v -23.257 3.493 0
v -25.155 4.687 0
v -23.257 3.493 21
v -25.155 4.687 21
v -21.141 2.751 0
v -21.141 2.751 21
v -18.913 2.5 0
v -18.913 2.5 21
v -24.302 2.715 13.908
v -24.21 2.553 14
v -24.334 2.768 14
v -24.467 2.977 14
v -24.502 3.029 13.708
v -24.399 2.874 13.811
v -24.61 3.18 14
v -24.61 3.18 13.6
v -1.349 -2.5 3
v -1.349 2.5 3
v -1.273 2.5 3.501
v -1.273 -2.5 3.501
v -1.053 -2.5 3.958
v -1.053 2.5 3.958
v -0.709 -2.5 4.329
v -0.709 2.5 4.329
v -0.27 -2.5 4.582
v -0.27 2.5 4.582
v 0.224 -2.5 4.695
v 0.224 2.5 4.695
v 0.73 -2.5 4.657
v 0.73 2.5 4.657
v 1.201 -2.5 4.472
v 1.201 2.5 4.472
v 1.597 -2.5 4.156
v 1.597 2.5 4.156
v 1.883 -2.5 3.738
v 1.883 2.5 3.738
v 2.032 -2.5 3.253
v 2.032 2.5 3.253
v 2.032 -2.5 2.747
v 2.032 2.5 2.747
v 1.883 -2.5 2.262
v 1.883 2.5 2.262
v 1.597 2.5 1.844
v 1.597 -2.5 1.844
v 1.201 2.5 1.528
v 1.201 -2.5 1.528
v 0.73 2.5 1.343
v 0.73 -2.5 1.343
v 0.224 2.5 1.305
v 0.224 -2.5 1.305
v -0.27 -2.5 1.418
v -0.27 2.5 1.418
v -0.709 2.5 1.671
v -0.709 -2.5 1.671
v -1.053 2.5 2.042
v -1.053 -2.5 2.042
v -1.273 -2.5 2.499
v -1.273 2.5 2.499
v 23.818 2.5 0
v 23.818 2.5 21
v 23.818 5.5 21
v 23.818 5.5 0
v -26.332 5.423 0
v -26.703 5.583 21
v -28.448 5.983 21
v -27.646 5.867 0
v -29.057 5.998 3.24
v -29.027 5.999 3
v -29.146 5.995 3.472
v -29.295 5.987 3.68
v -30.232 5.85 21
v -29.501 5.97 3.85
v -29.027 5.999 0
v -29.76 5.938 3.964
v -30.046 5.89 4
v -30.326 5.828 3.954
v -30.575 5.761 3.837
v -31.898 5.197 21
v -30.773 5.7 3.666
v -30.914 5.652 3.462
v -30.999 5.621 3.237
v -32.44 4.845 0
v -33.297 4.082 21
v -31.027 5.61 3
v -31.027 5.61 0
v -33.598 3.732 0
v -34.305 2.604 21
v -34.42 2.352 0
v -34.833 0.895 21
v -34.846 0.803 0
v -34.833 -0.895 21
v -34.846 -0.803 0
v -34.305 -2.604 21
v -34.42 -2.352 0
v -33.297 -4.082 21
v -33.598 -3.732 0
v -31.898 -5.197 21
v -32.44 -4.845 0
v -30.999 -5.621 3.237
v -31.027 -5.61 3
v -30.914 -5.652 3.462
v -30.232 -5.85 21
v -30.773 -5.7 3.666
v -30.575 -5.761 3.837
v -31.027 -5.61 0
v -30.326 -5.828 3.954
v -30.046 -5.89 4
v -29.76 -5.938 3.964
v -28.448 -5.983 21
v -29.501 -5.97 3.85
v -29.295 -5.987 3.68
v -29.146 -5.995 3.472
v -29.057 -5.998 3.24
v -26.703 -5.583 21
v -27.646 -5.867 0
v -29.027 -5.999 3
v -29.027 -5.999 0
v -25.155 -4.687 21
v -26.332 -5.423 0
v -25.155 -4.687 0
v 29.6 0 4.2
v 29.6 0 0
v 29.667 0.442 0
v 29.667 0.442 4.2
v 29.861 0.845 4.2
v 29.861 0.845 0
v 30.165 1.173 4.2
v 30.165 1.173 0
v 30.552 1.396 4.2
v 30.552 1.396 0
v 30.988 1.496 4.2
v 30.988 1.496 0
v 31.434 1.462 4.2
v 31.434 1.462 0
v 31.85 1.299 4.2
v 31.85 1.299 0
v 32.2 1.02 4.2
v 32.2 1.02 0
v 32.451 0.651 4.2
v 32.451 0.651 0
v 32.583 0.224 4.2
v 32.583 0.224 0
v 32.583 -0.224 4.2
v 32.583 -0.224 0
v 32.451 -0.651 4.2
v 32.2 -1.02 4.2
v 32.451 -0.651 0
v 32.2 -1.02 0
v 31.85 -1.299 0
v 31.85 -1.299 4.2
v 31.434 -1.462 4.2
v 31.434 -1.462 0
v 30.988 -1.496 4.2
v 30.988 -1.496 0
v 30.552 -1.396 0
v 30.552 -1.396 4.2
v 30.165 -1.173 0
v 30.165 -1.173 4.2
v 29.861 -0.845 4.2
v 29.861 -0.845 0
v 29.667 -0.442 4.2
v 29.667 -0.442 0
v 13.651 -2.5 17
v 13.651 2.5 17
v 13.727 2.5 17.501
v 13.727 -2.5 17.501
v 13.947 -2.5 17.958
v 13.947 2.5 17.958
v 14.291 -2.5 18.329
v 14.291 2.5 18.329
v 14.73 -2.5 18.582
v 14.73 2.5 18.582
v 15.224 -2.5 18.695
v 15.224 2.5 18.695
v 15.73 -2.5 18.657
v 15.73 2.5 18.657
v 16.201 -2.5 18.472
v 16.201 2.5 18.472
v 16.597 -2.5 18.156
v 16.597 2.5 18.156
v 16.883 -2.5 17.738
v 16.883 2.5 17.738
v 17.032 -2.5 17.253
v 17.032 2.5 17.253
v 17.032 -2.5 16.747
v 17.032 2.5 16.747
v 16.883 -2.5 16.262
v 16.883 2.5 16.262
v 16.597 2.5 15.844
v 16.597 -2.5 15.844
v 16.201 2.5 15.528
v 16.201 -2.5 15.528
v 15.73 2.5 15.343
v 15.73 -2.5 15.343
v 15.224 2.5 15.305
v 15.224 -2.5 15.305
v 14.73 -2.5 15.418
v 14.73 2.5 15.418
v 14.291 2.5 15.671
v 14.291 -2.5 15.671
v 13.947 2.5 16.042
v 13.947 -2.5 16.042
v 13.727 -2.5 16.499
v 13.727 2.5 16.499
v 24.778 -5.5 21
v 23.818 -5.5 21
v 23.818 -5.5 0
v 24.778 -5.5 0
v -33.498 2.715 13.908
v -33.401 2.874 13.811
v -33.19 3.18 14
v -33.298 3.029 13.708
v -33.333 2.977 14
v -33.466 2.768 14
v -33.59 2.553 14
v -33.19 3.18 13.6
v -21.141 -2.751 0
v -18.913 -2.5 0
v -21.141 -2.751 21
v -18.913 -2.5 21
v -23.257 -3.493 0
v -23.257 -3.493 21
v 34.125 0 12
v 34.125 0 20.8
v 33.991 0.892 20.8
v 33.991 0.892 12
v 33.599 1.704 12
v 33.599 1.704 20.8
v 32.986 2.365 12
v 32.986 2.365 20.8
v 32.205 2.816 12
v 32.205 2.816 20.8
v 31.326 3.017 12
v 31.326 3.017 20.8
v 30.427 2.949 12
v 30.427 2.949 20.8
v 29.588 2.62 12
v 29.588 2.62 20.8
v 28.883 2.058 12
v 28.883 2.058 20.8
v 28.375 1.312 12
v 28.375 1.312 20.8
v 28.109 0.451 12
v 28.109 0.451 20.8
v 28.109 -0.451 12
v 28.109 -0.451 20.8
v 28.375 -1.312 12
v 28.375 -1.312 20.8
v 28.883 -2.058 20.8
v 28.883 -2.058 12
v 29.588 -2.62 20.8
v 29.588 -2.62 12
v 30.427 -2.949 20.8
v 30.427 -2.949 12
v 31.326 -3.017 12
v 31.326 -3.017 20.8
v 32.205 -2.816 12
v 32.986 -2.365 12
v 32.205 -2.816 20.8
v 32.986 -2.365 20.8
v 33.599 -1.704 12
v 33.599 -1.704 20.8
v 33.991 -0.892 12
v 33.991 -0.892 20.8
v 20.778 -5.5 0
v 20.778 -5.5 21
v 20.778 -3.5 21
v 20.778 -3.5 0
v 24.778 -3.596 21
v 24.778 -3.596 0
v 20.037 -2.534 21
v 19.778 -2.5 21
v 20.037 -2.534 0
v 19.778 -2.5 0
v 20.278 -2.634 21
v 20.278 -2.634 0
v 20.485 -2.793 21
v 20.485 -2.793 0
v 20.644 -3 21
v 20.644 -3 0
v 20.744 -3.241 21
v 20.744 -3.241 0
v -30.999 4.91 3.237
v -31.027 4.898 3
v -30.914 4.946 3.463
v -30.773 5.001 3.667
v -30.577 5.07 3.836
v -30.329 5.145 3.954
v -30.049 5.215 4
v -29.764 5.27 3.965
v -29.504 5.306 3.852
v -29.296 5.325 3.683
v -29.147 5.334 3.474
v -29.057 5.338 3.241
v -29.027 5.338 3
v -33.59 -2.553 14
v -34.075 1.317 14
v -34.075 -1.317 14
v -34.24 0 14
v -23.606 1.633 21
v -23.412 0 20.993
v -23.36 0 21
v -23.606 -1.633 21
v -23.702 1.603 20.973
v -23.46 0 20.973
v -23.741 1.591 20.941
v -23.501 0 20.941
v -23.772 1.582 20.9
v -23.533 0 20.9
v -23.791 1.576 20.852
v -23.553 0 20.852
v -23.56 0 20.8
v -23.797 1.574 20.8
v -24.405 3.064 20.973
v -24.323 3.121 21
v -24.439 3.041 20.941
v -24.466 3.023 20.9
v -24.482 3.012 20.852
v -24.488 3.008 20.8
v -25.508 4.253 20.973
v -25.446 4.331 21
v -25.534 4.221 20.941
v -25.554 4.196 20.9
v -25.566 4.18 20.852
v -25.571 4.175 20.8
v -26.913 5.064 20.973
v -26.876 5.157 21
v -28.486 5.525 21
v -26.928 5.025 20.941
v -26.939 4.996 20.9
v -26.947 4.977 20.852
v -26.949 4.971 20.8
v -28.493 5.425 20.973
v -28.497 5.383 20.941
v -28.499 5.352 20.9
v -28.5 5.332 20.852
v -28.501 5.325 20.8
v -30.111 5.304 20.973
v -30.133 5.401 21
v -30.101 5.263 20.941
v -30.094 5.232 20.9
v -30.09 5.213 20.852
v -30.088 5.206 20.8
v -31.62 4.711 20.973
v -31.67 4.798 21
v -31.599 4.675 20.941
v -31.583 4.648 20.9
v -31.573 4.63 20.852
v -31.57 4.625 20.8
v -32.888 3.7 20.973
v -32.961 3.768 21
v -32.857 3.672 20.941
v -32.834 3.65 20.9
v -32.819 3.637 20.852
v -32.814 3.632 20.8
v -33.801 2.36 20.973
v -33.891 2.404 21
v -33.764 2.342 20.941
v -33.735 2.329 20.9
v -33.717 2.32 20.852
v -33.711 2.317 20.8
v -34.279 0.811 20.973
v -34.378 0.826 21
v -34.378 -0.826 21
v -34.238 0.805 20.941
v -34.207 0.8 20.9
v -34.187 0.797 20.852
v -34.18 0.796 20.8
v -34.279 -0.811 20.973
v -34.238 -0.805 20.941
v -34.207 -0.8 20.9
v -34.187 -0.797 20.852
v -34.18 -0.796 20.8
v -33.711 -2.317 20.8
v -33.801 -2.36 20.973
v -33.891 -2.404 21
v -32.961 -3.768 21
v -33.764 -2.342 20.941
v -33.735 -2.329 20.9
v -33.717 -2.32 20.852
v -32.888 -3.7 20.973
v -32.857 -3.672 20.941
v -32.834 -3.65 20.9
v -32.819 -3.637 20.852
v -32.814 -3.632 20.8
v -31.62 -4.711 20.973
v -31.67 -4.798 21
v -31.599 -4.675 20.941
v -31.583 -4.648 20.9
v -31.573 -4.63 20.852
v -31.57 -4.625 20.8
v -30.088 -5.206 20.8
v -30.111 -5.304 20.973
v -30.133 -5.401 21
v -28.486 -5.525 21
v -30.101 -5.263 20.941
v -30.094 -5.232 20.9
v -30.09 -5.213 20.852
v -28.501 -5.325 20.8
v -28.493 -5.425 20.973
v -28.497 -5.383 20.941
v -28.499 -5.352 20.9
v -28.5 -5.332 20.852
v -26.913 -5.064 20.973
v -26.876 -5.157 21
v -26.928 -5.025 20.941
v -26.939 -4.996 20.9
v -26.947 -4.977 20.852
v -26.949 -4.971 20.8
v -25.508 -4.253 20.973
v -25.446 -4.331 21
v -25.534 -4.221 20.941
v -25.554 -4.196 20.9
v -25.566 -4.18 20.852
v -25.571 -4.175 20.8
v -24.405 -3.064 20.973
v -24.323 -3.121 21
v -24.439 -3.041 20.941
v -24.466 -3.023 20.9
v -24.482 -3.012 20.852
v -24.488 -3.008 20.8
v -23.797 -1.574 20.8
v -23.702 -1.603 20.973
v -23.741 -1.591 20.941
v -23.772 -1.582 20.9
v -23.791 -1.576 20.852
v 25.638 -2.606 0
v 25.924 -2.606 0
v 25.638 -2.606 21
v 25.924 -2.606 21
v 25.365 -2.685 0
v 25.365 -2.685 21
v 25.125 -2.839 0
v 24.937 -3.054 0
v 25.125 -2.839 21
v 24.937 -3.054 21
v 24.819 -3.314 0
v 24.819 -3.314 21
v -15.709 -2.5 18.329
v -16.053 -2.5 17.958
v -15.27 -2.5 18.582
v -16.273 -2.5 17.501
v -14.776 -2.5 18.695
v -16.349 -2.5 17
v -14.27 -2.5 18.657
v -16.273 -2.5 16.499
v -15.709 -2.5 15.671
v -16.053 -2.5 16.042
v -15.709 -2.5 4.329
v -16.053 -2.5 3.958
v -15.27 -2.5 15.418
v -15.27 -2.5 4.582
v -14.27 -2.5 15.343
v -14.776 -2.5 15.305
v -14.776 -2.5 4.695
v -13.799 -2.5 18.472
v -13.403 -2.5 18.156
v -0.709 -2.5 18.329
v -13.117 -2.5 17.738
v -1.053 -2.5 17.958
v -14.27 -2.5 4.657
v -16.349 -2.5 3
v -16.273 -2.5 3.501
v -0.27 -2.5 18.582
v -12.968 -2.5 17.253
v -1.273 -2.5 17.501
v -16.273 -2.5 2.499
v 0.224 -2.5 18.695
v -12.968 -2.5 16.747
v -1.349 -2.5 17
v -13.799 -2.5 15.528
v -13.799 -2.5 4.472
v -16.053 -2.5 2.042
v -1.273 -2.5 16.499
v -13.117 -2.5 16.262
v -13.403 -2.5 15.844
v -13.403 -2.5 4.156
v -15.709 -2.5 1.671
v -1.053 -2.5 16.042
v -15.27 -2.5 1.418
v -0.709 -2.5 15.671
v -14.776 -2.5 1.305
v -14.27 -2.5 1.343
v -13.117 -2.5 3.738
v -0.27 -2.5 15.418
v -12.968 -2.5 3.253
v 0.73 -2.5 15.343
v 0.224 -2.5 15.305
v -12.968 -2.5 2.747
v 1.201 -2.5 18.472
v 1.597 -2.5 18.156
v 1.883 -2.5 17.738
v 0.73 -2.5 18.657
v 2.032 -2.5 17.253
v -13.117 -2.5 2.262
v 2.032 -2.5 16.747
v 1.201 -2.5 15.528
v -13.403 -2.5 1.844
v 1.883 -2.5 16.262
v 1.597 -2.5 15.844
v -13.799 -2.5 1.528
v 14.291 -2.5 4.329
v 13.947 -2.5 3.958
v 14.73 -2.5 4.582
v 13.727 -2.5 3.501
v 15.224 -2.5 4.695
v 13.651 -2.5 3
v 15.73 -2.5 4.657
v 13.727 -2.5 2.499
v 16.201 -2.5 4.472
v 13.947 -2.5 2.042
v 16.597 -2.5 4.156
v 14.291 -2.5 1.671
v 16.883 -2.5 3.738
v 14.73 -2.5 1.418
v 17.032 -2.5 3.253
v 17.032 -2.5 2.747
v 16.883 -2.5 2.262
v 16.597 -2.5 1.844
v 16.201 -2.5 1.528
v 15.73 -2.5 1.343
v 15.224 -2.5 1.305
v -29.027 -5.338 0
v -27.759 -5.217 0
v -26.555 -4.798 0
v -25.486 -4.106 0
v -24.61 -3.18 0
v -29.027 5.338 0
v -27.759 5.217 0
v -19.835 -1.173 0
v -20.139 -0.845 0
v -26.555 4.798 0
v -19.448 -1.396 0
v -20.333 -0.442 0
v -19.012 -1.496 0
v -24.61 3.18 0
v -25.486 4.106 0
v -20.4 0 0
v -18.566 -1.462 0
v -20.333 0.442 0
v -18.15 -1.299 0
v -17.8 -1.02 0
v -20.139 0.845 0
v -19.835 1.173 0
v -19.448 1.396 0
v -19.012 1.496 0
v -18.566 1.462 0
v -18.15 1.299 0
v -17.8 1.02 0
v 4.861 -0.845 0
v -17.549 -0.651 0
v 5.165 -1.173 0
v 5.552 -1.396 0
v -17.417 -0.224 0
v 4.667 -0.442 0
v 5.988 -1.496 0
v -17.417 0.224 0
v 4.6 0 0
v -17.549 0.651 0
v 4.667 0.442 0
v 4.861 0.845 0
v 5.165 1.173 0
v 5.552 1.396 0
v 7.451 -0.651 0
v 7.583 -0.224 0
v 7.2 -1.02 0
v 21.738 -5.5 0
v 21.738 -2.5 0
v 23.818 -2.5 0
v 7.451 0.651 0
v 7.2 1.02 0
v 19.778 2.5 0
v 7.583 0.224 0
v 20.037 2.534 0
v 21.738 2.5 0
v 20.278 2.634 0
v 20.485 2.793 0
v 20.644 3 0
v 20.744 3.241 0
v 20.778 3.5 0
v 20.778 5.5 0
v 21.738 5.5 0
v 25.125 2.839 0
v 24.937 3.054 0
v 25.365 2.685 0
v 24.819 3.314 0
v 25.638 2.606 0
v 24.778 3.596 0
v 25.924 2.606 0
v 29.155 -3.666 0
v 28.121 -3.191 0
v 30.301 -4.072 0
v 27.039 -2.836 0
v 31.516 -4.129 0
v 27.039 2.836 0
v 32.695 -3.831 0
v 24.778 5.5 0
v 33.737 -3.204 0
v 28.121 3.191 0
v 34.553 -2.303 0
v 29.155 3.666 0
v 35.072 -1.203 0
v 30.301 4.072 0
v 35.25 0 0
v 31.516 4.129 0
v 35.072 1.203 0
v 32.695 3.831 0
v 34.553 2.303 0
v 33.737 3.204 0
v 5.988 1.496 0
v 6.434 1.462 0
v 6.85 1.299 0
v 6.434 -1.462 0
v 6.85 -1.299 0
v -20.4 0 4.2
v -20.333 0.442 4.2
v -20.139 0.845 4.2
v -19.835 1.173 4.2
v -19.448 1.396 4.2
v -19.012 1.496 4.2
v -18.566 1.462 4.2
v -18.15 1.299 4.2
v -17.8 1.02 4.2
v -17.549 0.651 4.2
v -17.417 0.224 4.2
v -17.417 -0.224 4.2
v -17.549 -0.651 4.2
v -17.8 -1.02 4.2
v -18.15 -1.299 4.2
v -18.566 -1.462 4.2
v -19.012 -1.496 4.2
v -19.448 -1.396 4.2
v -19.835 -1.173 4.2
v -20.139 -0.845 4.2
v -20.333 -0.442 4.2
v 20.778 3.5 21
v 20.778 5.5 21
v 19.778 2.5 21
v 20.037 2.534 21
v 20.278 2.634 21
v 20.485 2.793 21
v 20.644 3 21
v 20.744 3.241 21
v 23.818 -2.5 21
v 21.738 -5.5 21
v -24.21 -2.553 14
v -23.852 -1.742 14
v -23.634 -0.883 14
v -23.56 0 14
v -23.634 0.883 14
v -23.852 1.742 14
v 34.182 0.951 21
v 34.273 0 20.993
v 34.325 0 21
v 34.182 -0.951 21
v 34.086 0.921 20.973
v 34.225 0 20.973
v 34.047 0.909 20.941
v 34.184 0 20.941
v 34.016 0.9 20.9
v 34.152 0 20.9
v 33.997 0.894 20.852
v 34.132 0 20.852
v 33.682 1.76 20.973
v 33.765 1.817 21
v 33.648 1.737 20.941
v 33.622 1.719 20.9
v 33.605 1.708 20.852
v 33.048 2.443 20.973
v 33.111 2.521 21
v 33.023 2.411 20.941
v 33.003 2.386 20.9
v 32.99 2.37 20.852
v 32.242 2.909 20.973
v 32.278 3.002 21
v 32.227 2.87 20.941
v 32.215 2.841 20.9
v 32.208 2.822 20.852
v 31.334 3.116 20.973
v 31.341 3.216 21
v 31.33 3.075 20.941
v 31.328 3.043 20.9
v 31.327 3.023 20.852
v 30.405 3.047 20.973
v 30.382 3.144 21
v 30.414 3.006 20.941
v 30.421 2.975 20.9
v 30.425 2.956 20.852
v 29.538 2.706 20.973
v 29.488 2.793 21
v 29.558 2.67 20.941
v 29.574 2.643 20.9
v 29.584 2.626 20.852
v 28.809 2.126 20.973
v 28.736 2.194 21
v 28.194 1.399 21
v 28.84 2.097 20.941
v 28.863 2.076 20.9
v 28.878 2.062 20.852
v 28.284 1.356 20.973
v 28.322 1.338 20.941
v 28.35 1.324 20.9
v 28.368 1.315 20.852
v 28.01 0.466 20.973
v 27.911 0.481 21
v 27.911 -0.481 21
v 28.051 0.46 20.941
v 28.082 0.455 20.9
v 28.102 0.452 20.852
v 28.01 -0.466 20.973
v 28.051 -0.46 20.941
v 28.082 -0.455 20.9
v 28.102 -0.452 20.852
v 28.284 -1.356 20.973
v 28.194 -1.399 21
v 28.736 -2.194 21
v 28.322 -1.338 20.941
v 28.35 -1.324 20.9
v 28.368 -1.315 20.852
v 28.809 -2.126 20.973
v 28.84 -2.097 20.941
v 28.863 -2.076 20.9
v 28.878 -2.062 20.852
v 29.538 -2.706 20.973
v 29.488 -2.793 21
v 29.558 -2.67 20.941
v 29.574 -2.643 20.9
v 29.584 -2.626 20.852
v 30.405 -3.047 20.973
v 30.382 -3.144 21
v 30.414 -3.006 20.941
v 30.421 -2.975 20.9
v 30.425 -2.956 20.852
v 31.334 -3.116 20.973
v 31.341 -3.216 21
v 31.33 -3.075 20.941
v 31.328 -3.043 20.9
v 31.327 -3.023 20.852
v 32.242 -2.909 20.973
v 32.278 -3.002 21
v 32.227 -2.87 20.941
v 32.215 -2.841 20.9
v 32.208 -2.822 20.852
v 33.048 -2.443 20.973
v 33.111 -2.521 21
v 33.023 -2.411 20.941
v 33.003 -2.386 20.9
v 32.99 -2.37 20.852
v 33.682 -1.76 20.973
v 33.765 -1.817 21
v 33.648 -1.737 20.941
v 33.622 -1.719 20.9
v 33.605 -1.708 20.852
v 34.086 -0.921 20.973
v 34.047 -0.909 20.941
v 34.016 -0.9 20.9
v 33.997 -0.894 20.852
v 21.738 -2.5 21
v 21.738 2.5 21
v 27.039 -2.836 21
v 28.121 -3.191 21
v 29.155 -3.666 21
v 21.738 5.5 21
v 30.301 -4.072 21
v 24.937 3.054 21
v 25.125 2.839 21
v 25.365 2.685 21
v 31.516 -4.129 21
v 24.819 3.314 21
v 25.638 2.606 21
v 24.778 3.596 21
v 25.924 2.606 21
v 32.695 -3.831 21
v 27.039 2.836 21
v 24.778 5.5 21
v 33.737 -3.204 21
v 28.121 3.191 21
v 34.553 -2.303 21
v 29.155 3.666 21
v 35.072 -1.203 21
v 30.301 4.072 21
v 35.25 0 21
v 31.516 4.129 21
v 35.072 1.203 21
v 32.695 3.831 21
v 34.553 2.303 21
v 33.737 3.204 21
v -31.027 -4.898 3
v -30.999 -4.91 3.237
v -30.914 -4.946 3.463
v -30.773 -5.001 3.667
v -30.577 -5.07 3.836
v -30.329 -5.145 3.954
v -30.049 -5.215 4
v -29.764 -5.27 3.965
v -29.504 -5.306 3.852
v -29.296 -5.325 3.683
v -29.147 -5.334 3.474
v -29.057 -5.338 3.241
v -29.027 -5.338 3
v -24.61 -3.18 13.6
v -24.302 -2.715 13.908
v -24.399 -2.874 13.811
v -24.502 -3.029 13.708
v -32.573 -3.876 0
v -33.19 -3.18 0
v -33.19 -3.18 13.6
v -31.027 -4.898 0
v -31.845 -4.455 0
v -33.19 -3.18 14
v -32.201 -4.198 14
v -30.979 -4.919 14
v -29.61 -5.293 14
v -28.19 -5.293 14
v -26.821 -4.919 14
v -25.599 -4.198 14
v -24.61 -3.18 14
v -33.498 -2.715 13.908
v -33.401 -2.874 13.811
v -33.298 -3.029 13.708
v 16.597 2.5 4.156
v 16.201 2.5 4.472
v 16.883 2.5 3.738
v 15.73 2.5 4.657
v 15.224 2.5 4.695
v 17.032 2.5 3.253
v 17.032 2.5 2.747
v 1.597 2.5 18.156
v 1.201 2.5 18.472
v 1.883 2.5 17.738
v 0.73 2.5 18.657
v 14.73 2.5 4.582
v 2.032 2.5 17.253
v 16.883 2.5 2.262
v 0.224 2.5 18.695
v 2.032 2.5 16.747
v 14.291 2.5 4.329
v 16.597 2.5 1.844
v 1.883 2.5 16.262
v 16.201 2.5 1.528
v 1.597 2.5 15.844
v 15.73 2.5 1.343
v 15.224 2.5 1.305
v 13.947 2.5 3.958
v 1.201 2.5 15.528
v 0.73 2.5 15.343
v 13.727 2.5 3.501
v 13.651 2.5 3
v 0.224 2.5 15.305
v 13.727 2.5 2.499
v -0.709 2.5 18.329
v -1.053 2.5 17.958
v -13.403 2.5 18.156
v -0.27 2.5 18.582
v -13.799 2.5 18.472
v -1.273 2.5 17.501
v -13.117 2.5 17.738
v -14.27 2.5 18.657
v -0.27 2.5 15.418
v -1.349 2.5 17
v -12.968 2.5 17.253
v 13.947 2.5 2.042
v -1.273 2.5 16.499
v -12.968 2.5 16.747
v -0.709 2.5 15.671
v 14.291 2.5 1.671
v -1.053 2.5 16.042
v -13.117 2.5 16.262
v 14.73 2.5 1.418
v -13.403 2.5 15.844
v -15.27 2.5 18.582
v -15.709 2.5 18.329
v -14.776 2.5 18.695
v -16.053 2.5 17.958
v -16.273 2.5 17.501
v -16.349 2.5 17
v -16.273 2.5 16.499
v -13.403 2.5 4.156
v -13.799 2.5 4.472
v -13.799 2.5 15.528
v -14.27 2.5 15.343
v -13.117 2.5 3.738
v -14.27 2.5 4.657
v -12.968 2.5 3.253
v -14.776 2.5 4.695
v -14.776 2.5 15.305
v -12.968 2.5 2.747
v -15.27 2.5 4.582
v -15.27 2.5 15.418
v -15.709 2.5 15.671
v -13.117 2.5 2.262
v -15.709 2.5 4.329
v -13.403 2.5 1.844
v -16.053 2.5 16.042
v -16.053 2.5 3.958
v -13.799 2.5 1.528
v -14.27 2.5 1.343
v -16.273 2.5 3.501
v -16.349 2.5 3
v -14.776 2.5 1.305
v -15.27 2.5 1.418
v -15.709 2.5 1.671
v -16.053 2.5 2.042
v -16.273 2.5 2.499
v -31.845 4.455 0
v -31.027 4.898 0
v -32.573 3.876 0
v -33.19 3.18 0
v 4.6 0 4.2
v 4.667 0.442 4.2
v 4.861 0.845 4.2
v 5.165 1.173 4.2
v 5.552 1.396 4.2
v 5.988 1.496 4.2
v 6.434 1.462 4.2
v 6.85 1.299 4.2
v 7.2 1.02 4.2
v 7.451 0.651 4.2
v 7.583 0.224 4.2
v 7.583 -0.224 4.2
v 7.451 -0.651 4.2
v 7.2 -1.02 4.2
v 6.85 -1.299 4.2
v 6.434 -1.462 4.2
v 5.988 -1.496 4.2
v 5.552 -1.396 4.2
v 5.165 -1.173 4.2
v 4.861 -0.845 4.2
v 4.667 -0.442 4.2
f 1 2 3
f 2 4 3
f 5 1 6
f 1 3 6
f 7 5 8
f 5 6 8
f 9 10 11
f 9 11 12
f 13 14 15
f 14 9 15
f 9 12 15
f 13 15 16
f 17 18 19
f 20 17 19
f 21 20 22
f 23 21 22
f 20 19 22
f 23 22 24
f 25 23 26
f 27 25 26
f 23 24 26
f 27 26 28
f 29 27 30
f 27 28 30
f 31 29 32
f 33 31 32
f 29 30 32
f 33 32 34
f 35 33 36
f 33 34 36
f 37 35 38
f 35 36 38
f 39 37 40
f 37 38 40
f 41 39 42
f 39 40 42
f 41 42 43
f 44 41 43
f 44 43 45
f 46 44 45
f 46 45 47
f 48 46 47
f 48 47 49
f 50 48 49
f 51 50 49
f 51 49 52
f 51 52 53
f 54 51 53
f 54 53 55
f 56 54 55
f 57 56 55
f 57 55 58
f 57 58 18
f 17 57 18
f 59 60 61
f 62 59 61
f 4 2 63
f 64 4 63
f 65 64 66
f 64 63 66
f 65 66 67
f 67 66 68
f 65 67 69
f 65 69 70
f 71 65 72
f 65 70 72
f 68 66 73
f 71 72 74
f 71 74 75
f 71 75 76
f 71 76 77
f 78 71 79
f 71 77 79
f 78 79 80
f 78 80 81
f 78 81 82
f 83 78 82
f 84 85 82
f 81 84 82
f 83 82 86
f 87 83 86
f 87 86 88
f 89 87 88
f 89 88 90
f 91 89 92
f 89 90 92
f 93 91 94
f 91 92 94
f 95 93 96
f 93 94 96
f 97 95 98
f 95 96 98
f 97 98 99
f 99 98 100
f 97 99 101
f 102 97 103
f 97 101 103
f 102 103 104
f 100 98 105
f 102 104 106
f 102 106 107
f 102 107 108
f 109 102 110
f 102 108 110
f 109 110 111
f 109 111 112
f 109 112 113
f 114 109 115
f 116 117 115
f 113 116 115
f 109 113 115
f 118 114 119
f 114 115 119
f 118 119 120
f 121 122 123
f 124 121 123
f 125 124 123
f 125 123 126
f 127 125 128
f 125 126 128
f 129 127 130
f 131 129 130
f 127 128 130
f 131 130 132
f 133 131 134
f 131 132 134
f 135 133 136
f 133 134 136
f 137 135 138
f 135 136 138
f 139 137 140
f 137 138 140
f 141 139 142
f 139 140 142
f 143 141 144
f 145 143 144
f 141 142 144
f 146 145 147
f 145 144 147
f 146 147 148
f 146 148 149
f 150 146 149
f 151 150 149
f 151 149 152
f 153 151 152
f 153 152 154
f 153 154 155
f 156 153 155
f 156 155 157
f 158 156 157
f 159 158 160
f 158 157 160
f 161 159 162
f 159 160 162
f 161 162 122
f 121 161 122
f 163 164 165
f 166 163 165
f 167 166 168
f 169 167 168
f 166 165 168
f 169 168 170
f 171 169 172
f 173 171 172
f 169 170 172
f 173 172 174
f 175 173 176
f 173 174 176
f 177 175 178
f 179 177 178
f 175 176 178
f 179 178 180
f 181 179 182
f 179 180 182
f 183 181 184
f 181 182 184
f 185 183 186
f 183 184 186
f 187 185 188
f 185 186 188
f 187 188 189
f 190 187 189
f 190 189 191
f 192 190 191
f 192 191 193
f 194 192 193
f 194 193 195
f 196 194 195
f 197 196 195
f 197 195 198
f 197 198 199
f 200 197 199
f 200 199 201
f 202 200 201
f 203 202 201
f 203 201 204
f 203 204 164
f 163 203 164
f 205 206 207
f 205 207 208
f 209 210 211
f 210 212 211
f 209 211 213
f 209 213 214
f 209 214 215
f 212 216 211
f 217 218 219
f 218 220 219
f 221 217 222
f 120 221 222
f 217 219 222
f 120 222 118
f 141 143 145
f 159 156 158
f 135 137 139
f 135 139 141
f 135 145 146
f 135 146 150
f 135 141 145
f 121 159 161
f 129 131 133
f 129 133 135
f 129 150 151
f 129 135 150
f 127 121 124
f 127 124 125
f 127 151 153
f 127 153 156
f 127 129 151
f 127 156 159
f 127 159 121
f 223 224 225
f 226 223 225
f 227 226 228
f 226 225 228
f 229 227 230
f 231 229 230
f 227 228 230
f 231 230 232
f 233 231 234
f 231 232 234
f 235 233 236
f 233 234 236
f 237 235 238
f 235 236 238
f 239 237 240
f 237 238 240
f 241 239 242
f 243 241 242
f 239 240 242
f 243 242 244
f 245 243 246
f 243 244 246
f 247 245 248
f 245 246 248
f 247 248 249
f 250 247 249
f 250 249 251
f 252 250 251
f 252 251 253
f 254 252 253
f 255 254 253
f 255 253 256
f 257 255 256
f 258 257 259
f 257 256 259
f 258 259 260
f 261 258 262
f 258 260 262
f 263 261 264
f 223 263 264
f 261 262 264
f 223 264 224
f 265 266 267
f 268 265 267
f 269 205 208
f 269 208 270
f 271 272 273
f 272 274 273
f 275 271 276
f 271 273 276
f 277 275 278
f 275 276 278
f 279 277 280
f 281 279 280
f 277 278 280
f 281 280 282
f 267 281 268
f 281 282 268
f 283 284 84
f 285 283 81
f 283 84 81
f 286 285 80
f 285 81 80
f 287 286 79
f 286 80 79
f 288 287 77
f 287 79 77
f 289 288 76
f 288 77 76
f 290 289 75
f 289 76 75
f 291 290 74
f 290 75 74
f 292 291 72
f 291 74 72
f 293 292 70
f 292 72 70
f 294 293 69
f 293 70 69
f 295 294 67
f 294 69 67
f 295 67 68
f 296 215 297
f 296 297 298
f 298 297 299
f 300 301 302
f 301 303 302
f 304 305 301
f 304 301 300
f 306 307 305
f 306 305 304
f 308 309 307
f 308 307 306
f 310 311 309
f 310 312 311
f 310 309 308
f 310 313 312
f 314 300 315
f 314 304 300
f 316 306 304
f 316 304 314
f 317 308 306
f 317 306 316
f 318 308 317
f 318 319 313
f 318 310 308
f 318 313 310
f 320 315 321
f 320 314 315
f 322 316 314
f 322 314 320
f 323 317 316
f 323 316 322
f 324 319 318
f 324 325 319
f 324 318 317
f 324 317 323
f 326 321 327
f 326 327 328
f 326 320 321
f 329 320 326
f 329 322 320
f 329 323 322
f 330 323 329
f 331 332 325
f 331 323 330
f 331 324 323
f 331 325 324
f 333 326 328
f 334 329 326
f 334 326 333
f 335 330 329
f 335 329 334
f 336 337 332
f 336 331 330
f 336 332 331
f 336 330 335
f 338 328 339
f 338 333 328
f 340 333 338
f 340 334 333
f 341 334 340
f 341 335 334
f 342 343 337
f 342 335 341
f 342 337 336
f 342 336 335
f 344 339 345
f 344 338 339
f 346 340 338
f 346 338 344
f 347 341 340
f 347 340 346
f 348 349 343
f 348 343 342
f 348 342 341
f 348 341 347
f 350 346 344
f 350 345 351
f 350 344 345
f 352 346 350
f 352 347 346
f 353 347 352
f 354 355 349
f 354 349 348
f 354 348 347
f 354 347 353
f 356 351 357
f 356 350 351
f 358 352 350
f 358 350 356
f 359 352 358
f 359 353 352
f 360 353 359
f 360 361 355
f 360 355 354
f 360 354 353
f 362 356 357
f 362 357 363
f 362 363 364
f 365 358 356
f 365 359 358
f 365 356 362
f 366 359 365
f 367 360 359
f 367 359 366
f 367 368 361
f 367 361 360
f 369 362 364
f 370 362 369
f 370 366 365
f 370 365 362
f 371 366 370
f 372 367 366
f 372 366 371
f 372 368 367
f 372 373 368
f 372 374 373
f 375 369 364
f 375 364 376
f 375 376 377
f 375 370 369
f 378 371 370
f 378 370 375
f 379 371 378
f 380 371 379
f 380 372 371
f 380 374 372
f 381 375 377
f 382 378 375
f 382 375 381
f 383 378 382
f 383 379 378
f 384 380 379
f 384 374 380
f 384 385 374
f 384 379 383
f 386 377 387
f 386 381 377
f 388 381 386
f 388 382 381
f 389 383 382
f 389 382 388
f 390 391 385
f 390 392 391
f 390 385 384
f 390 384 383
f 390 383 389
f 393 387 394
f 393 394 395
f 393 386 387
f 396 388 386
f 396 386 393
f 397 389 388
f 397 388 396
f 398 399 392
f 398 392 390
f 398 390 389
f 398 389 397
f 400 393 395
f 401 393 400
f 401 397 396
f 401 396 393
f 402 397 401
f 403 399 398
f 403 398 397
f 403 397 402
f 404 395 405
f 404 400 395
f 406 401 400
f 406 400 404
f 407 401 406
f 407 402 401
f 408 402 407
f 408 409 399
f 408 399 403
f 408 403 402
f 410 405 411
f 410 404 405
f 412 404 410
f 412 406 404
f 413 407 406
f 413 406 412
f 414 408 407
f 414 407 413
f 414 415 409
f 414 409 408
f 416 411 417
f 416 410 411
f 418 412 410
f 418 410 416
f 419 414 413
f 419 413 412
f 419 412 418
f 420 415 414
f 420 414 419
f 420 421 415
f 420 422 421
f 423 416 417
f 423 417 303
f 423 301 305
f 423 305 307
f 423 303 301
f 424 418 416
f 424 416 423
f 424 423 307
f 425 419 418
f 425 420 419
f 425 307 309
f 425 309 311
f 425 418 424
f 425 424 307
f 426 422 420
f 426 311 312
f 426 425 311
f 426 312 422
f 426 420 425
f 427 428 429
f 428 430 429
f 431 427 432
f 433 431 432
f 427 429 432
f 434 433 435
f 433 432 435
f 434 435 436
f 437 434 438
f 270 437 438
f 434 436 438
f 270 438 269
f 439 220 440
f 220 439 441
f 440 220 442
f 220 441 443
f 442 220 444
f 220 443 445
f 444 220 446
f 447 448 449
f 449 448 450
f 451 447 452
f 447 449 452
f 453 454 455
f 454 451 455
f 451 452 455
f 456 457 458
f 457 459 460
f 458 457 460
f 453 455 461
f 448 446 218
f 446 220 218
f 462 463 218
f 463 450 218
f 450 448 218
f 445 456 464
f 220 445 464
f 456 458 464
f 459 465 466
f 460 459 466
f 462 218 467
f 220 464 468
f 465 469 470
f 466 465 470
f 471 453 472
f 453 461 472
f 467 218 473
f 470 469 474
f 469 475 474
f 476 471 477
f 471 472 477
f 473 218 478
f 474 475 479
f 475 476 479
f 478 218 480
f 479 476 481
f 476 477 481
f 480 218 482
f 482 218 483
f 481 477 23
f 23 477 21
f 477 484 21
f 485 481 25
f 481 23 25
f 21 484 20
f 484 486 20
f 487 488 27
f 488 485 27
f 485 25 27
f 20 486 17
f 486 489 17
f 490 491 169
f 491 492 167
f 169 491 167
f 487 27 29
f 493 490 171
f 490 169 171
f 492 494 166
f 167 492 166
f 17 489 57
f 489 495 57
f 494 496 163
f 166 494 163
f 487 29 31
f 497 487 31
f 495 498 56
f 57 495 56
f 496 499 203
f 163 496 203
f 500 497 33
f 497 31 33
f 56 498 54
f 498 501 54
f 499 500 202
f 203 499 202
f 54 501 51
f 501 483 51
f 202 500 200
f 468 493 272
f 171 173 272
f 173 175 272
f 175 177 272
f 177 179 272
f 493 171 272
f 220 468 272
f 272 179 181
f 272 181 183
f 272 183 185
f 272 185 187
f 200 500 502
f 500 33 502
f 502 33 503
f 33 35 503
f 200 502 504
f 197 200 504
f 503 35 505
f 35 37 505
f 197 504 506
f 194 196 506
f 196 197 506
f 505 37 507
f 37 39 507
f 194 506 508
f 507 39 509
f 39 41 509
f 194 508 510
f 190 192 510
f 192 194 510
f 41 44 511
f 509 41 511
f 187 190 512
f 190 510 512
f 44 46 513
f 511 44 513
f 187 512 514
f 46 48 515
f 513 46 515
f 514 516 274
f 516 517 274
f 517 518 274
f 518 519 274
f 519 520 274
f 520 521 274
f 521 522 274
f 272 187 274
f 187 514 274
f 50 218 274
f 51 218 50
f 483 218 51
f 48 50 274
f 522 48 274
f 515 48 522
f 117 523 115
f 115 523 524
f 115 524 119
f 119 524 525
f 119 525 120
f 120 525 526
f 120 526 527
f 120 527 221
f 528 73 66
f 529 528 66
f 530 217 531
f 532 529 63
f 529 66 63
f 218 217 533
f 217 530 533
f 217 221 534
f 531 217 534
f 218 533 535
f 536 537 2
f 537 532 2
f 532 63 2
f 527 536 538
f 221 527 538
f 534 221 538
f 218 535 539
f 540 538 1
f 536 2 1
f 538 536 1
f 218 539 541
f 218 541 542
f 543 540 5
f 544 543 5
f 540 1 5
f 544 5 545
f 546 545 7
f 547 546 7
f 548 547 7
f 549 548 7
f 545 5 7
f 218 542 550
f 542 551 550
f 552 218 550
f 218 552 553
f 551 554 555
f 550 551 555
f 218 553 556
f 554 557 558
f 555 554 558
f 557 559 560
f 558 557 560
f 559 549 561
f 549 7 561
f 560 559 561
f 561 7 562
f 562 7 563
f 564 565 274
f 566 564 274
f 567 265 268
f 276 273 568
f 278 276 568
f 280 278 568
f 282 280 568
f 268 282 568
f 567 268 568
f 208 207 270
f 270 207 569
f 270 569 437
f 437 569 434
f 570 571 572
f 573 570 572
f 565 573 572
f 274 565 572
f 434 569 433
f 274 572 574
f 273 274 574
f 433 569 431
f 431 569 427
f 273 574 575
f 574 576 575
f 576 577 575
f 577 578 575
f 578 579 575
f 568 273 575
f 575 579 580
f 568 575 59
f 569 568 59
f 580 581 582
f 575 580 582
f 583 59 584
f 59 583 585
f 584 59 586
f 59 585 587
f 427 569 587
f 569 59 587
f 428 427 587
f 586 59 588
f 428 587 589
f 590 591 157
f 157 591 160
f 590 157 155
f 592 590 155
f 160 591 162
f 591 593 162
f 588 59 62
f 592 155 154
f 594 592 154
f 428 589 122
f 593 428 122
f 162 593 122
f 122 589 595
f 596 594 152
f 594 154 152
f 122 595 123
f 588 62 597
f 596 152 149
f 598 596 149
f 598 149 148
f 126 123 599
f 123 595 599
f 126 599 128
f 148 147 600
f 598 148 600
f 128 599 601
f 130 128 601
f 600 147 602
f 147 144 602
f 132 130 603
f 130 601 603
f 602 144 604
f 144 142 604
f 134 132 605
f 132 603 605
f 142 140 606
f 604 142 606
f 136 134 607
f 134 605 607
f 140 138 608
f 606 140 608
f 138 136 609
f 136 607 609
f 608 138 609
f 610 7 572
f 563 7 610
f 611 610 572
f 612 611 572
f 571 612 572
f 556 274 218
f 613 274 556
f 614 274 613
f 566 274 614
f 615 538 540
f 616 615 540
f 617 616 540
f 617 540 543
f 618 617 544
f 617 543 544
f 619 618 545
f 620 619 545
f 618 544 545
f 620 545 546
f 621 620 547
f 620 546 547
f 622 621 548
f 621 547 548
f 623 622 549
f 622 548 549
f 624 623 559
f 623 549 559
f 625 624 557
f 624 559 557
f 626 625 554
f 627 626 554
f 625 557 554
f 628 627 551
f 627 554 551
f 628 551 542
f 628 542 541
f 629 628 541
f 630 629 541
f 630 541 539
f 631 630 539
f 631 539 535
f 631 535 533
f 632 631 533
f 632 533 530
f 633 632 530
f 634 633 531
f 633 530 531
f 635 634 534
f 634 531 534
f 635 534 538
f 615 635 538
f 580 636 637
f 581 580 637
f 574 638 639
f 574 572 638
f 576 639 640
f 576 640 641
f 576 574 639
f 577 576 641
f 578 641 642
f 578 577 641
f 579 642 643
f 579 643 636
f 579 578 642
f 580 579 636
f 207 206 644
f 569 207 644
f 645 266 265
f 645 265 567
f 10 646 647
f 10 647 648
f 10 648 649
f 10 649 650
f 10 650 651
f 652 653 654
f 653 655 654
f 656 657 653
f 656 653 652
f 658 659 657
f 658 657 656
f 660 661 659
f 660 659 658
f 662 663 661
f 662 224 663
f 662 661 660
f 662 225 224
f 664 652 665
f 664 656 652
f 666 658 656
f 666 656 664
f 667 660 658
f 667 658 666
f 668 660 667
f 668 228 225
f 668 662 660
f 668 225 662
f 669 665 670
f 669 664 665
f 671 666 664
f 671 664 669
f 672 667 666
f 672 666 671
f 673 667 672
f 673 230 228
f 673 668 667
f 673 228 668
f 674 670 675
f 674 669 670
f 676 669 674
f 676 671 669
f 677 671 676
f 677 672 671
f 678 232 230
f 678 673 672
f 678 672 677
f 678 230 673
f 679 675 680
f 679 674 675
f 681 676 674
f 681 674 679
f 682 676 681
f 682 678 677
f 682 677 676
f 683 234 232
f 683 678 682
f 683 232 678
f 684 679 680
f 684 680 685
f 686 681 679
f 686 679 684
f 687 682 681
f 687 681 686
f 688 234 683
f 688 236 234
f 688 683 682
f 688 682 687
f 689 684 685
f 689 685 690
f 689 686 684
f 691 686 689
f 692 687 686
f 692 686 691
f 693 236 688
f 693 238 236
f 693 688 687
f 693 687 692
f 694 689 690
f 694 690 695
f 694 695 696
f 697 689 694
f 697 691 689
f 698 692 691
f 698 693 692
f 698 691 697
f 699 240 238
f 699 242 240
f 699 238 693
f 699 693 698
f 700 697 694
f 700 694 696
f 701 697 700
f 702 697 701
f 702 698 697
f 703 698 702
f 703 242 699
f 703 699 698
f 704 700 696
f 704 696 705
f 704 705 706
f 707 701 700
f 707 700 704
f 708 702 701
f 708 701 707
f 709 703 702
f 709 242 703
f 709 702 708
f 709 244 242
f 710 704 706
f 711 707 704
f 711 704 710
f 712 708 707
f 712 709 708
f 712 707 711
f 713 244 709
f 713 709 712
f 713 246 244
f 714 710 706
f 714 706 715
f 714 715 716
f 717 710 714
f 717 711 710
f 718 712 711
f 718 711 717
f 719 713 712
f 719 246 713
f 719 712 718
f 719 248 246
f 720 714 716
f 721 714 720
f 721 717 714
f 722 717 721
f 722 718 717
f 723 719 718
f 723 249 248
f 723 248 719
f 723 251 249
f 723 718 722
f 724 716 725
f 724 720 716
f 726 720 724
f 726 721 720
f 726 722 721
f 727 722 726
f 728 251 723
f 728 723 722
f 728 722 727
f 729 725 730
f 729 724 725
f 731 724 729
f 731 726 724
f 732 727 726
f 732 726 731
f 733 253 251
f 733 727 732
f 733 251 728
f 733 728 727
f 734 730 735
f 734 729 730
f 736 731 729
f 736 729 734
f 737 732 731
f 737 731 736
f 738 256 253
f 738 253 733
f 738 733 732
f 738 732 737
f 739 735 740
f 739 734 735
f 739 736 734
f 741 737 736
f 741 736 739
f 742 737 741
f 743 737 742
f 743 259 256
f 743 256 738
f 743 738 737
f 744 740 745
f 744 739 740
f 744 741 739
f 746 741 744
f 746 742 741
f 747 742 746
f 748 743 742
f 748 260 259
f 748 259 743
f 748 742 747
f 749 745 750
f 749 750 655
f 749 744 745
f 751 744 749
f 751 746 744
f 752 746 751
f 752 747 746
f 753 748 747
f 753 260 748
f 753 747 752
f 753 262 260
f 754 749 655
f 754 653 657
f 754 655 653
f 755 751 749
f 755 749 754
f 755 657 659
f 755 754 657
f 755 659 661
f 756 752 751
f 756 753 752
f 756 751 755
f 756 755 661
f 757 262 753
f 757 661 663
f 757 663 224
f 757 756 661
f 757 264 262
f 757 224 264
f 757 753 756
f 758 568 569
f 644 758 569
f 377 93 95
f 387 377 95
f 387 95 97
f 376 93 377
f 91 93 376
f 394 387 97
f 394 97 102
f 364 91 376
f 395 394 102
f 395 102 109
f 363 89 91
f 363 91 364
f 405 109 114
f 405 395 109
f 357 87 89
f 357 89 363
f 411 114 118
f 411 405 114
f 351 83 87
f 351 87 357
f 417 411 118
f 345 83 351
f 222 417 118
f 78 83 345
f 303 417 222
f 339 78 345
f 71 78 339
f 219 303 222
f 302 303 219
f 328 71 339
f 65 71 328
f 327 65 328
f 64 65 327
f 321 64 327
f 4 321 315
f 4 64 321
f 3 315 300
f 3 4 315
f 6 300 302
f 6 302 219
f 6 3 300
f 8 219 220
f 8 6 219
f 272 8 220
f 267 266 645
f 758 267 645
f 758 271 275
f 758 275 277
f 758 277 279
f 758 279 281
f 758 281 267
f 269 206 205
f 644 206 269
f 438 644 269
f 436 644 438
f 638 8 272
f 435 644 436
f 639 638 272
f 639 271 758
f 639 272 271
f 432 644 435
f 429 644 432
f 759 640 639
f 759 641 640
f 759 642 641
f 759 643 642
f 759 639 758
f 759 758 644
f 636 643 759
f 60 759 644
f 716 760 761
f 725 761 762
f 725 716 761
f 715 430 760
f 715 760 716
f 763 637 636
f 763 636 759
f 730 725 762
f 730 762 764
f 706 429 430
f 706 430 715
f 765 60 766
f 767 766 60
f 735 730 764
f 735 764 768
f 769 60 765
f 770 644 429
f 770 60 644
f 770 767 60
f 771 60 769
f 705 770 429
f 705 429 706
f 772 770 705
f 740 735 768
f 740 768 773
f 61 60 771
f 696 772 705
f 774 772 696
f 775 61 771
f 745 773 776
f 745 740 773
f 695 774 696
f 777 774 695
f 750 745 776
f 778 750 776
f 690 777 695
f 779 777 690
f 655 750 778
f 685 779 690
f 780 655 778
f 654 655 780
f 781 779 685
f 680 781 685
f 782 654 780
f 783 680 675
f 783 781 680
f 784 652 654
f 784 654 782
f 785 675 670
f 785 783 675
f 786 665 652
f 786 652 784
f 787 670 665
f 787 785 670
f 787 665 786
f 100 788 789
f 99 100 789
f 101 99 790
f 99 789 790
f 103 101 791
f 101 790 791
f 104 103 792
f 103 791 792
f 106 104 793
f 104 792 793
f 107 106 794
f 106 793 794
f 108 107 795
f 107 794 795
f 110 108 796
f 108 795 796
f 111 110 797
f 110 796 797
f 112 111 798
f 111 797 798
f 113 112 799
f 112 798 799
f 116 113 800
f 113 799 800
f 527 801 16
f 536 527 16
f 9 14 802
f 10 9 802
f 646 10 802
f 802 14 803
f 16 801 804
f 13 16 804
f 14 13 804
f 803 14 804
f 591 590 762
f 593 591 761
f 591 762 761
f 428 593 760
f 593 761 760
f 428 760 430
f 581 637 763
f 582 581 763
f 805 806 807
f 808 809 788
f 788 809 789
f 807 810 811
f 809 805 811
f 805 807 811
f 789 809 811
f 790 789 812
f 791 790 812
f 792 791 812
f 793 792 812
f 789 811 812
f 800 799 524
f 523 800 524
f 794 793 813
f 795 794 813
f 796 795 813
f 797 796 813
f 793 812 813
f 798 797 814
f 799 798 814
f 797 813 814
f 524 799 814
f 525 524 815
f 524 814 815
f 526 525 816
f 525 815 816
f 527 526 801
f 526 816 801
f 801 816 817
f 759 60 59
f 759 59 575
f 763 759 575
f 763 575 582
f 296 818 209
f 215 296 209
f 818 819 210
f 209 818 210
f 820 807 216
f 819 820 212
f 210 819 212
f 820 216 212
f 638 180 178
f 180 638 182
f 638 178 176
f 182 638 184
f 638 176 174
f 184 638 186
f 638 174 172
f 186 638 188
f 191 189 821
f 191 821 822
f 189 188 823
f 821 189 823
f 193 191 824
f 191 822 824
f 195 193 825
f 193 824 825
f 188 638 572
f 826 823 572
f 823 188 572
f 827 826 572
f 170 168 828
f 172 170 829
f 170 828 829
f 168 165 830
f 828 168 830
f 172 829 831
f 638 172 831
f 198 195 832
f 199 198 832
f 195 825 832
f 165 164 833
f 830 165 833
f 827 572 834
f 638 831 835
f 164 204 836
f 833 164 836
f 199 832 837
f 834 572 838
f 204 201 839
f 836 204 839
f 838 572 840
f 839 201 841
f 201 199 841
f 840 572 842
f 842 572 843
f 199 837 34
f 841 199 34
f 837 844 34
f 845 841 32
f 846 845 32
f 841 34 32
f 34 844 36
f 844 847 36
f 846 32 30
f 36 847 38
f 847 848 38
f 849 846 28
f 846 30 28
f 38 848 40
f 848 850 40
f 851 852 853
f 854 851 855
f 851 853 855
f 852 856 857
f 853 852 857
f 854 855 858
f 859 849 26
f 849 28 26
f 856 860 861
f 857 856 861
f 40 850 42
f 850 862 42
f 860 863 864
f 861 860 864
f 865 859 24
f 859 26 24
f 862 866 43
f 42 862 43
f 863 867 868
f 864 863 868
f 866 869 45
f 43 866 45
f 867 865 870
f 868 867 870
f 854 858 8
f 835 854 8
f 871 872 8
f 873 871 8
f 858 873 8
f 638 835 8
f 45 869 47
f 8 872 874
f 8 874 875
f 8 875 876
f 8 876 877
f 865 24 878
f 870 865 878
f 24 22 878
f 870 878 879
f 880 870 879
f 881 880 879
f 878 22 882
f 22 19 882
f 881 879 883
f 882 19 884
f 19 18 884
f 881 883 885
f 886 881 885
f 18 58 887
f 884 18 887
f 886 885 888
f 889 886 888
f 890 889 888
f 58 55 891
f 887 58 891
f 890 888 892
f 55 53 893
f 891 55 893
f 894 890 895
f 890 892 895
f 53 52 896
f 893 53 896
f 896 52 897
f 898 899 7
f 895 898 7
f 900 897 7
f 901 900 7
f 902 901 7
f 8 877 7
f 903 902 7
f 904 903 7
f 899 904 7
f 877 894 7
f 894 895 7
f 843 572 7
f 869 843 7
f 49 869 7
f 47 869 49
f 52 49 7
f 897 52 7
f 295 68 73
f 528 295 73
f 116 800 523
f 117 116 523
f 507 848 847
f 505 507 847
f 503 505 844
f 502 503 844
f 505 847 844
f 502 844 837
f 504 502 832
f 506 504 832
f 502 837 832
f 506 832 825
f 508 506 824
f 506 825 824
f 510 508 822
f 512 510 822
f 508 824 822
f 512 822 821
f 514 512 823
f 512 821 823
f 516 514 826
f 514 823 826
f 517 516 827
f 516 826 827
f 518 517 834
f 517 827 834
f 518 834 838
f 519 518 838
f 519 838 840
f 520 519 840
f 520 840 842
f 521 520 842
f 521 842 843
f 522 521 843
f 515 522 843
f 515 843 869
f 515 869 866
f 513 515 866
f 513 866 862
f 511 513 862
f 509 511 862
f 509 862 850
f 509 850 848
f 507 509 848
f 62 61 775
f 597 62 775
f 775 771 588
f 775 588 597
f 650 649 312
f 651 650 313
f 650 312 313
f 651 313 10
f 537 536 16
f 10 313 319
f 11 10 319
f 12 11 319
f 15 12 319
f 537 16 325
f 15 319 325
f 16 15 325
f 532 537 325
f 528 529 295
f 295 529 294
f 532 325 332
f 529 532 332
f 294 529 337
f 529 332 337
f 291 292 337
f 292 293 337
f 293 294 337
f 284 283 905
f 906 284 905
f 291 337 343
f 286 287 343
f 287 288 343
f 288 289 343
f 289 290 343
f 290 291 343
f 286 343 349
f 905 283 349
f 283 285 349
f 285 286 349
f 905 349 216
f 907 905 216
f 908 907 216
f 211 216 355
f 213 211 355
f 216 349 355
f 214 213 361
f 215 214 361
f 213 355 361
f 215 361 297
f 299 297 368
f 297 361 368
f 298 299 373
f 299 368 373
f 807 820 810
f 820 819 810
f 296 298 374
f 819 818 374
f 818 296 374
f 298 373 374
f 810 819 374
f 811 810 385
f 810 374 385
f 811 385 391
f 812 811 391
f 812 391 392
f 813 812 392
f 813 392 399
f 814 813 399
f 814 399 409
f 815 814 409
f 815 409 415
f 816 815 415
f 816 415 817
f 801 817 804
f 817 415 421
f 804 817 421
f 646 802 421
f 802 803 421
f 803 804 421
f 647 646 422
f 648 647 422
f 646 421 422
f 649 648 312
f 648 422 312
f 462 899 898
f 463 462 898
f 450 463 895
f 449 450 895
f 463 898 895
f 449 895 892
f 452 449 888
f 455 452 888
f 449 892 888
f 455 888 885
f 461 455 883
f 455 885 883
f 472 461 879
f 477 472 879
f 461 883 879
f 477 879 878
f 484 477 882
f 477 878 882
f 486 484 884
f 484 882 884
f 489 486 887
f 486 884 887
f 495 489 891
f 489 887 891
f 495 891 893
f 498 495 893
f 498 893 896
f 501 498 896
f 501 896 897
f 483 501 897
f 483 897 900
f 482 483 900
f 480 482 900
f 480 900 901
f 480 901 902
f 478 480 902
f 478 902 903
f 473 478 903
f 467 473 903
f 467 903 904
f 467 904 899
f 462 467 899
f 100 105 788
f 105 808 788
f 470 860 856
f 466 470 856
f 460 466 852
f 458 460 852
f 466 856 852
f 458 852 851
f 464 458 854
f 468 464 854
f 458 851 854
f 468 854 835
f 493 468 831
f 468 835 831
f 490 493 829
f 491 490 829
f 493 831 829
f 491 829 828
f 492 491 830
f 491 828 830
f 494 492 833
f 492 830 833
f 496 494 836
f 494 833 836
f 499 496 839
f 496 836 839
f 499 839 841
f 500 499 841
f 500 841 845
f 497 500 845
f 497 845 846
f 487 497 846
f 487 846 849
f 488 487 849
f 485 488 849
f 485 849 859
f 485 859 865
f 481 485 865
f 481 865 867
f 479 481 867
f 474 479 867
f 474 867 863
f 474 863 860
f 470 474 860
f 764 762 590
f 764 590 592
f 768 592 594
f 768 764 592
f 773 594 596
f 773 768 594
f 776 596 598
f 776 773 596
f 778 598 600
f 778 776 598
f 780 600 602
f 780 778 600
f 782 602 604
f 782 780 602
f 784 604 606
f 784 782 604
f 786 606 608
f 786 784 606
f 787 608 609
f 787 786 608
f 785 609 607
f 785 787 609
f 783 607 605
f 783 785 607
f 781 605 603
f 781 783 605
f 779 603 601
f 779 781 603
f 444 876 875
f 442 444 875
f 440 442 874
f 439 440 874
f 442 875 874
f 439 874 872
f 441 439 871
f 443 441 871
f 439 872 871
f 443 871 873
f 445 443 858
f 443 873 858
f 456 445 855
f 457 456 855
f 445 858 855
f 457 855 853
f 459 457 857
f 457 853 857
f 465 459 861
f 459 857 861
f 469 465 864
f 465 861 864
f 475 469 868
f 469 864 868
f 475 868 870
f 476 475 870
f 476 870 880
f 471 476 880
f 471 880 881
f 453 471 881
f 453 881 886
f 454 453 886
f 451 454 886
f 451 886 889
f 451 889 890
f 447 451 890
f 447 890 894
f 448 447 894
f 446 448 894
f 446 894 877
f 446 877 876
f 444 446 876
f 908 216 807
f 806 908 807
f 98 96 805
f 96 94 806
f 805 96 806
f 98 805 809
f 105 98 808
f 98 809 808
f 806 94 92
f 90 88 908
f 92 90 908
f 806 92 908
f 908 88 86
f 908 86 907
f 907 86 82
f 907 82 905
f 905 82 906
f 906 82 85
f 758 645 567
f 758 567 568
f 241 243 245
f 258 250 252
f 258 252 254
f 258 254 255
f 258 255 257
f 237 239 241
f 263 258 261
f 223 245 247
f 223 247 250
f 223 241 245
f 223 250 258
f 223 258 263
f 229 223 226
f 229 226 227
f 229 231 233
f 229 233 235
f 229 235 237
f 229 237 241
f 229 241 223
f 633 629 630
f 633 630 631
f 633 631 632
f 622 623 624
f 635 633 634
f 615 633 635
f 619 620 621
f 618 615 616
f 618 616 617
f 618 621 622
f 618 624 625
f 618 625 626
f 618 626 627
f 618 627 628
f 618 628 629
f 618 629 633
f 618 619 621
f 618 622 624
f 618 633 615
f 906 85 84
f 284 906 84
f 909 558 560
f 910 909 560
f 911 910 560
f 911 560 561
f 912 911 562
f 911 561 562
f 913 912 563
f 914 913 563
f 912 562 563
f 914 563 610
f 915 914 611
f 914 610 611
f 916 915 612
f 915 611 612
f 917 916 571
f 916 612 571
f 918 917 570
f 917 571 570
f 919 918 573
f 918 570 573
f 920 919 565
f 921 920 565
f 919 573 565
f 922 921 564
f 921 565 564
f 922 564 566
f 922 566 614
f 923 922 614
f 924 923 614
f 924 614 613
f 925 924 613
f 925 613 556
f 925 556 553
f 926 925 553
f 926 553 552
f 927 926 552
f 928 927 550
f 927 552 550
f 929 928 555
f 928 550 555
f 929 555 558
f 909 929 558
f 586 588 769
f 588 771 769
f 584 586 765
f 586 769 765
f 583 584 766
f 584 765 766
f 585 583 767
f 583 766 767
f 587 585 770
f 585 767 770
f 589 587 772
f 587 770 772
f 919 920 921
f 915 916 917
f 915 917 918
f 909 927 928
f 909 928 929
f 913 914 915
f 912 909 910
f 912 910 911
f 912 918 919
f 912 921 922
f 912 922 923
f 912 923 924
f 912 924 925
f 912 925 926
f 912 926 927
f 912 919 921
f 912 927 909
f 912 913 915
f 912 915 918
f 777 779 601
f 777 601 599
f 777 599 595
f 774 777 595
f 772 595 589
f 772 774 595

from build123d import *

# Parameters (mm, degrees)
BOSS_EXTRUDE1_DEPTH = 21
SKETCH2_R           = 5.34
CUT_EXTRUDE1_DEPTH  = 7
CUT_EXTRUDE2_DEPTH  = 39.078996836
CHAMFER1_SIZE       = 0.4
FILLET1_R           = 10
SKETCH4_R           = 1
CUT_EXTRUDE3_DEPTH  = 8.125
SKETCH6_R           = 4.15
BOSS_EXTRUDE2_DEPTH = 21
FILLET2_R           = 10
SKETCH5_R           = 1.5
CUT_EXTRUDE5_DEPTH  = 4.2
SKETCH7_R           = 3.025
CUT_EXTRUDE6_DEPTH  = 9
FILLET3_R           = 0.2
SKETCH8_W           = 0.96
SKETCH8_H           = 4
BOSS_EXTRUDE3_DEPTH = 21
FILLET4_R           = 1
SKETCH10_R          = 1.7
CUT_EXTRUDE7_DEPTH  = 43.006695945
SKETCH12_W          = 4
SKETCH12_H          = 1
CUT_EXTRUDE8_DEPTH  = 42.542899564


with BuildPart() as part:
    # Sketch1 → Boss-Extrude1 (new body)
    with BuildSketch(Plane.XY):
        with BuildLine():
            Line((-23.445643943, -2.5), (31.1, -2.5))
            ThreePointArc((31.1, -2.5), (33.6, 0), (31.1, 2.5))
            Line((31.1, 2.5), (-23.445643943, 2.5))
            ThreePointArc((-23.445643943, 2.5), (-34.9, 0), (-23.445643943, -2.5))
        make_face()
    extrude(amount=BOSS_EXTRUDE1_DEPTH)

    # Sketch2 → Cut-Extrude1 (cut)
    with BuildSketch(Plane.XY.offset(21)):
        with Locations((-28.9, 0)):
            Circle(SKETCH2_R)
    extrude(amount=-CUT_EXTRUDE1_DEPTH, mode=Mode.SUBTRACT)

    # Sketch3 → Cut-Extrude2 (cut, through all)
    with BuildSketch(Plane.XY.offset(14)):
        with BuildLine():
            Line((-33.19, 3.179858487), (-33.19, -3.179858487))
            ThreePointArc((-33.19, -3.179858487), (-28.9, -5.34), (-24.61, -3.179858487))
            Line((-24.61, -3.179858487), (-24.61, 3.179858487))
            ThreePointArc((-24.61, 3.179858487), (-28.9, 5.34), (-33.19, 3.179858487))
        make_face()
    extrude(amount=-CUT_EXTRUDE2_DEPTH, mode=Mode.SUBTRACT)

    # Chamfer1
    # the kernel refuses this chamfer: 0.4 mm, written as the material it takes off along each edge
    with BuildSketch(Plane(origin=(-24.61, -4.208531683, 14), x_dir=(-0.027495876610587302, 0, -0.9996219169112966), z_dir=(0, 1, 0))) as chamfer1_piece_1_section:
        Polygon((CHAMFER1_SIZE * 0.999621916911, -CHAMFER1_SIZE * 0.0274958766106), (-CHAMFER1_SIZE * 0.0274958766106, -CHAMFER1_SIZE * 0.999621916911), (0, 0), align=None)
    chamfer1_piece_1 = extrude(amount=8.417063365, mode=Mode.PRIVATE)
    chamfer1_piece_1 = chamfer1_piece_1 & Plane(origin=(-28.9, 0, 13.865333272), x_dir=(0.803370786516886, 0.595479117493838, 0), z_dir=(0, 0, 1)) * Cylinder(5.34, 19, mode=Mode.PRIVATE)
    add(chamfer1_piece_1, mode=Mode.SUBTRACT)
    with BuildSketch(Plane(origin=(-33.19, 4.208531683, 14), x_dir=(0.027495876610578673, 0, -0.999621916911297), z_dir=(0, -1, 0))) as chamfer1_piece_2_section:
        Polygon((CHAMFER1_SIZE * 0.999621916911, -CHAMFER1_SIZE * 0.0274958766106), (-CHAMFER1_SIZE * 0.0274958766106, -CHAMFER1_SIZE * 0.999621916911), (0, 0), align=None)
    chamfer1_piece_2 = extrude(amount=8.417063365, mode=Mode.PRIVATE)
    chamfer1_piece_2 = chamfer1_piece_2 & Plane(origin=(-28.9, 0, 13.865333272), x_dir=(0.803370786516886, 0.595479117493838, 0), z_dir=(0, 0, 1)) * Cylinder(5.34, 19, mode=Mode.PRIVATE)
    add(chamfer1_piece_2, mode=Mode.SUBTRACT)

    # Fillet1
    fillet1_edges = [part.edges().sort_by_distance(p)[0] for p in [
        (-23.445643943, 2.5, 10.5),
        (-23.445643943, -2.5, 10.5),
    ]]
    fillet(fillet1_edges, radius=FILLET1_R)

    # Sketch4 → Cut-Extrude3 (cut, symmetric)
    with BuildSketch(Plane(origin=(0, 0, 0), x_dir=(1, 0, 0), z_dir=(0, 1, 0))):
        with Locations((-30.027345217, -3)):
            Circle(SKETCH4_R)
        with BuildLine():
            ThreePointArc((-31.027345217, -3), (-30.027345217, -2), (-29.027345217, -3))
            Line((-29.027345217, -3), (-29.027345217, 4))
            Line((-29.027345217, 4), (-31.027345217, 4))
            Line((-31.027345217, 4), (-31.027345217, -3))
        make_face()
    extrude(amount=CUT_EXTRUDE3_DEPTH, both=True, mode=Mode.SUBTRACT)

    # Sketch6 → Boss-Extrude2 (add, through all)
    with BuildSketch(Plane.XY.offset(21)):
        with Locations((31.1, 0)):
            Circle(SKETCH6_R)
    extrude(amount=-BOSS_EXTRUDE2_DEPTH)

    # Fillet2
    fillet2_edges = [part.edges().sort_by_distance(p)[0] for p in [
        (27.787523585, 2.5, 10.5),
        (27.787523585, -2.5, 10.5),
    ]]
    fillet(fillet2_edges, radius=FILLET2_R)

    # Sketch5 → Cut-Extrude5 (cut)
    with BuildSketch(Plane(origin=(0, 0, 0), x_dir=(-1, 0, 0), z_dir=(0, 0, -1))):
        with Locations((-31.1, 0)):
            Circle(SKETCH5_R)
        with Locations((-6.1, 0)):
            Circle(SKETCH5_R)
        with Locations((18.9, 0)):
            Circle(SKETCH5_R)
    extrude(amount=-CUT_EXTRUDE5_DEPTH, mode=Mode.SUBTRACT)

    # Sketch7 → Cut-Extrude6 (cut)
    with BuildSketch(Plane.XY.offset(21)):
        with Locations((31.1, 0)):
            Circle(SKETCH7_R)
    extrude(amount=-CUT_EXTRUDE6_DEPTH, mode=Mode.SUBTRACT)

    # Fillet3
    fillet3_edges = [part.edges().sort_by_distance(p)[0] for p in [
        (28.075, 0, 21),
        (-34.24, 0, 21),
    ]]
    fillet(fillet3_edges, radius=FILLET3_R)

    # Sketch8 → Boss-Extrude3 (add, through all)
    with BuildSketch(Plane.XY.offset(21)):
        with Locations((21.258157906, 4.5)):
            Rectangle(SKETCH8_W, SKETCH8_H)
        with Locations((24.298157906, 4.5)):
            Rectangle(SKETCH8_W, SKETCH8_H)
        with Locations((21.258157906, -4.5)):
            Rectangle(SKETCH8_W, SKETCH8_H)
        with Locations((24.298157906, -4.5)):
            Rectangle(SKETCH8_W, SKETCH8_H)
    extrude(amount=-BOSS_EXTRUDE3_DEPTH)

    # Fillet4
    fillet4_edges = [part.edges().sort_by_distance(p)[0] for p in [
        (20.778157906, 2.5, 10.5),
        (24.778157906, 2.50478553, 10.5),
        (20.778157906, -2.5, 10.5),
        (24.778157906, -2.50478553, 10.5),
    ]]
    fillet(fillet4_edges, radius=FILLET4_R)

    # Sketch10 → Cut-Extrude7 (cut, through all)
    with BuildSketch(Plane(origin=(0, 2.5, 0), x_dir=(1, 0, 0), z_dir=(0, 1, 0))):
        with Locations(Location((-14.648773097, -17, 0), (0, 0, 180))):
            Circle(SKETCH10_R)
        with Locations(Location((0.351226903, -17, 0), (0, 0, 180))):
            Circle(SKETCH10_R)
        with Locations(Location((15.351226903, -17, 0), (0, 0, 180))):
            Circle(SKETCH10_R)
        with Locations(Location((0.351226903, -3, 0), (0, 0, 180))):
            Circle(SKETCH10_R)
        with Locations(Location((15.351226903, -3, 0), (0, 0, 180))):
            Circle(SKETCH10_R)
        with Locations(Location((-14.648773097, -3, 0), (0, 0, 180))):
            Circle(SKETCH10_R)
    extrude(amount=-CUT_EXTRUDE7_DEPTH, mode=Mode.SUBTRACT)

    # Sketch12 → Cut-Extrude8 (cut, through all)
    with BuildSketch(Plane.XY.offset(21)):
        with Locations((22.778157906, 6)):
            Rectangle(SKETCH12_W, SKETCH12_H)
        with Locations((22.778157906, -6)):
            Rectangle(SKETCH12_W, SKETCH12_H)
    extrude(amount=-CUT_EXTRUDE8_DEPTH, mode=Mode.SUBTRACT)


solid = part.part
